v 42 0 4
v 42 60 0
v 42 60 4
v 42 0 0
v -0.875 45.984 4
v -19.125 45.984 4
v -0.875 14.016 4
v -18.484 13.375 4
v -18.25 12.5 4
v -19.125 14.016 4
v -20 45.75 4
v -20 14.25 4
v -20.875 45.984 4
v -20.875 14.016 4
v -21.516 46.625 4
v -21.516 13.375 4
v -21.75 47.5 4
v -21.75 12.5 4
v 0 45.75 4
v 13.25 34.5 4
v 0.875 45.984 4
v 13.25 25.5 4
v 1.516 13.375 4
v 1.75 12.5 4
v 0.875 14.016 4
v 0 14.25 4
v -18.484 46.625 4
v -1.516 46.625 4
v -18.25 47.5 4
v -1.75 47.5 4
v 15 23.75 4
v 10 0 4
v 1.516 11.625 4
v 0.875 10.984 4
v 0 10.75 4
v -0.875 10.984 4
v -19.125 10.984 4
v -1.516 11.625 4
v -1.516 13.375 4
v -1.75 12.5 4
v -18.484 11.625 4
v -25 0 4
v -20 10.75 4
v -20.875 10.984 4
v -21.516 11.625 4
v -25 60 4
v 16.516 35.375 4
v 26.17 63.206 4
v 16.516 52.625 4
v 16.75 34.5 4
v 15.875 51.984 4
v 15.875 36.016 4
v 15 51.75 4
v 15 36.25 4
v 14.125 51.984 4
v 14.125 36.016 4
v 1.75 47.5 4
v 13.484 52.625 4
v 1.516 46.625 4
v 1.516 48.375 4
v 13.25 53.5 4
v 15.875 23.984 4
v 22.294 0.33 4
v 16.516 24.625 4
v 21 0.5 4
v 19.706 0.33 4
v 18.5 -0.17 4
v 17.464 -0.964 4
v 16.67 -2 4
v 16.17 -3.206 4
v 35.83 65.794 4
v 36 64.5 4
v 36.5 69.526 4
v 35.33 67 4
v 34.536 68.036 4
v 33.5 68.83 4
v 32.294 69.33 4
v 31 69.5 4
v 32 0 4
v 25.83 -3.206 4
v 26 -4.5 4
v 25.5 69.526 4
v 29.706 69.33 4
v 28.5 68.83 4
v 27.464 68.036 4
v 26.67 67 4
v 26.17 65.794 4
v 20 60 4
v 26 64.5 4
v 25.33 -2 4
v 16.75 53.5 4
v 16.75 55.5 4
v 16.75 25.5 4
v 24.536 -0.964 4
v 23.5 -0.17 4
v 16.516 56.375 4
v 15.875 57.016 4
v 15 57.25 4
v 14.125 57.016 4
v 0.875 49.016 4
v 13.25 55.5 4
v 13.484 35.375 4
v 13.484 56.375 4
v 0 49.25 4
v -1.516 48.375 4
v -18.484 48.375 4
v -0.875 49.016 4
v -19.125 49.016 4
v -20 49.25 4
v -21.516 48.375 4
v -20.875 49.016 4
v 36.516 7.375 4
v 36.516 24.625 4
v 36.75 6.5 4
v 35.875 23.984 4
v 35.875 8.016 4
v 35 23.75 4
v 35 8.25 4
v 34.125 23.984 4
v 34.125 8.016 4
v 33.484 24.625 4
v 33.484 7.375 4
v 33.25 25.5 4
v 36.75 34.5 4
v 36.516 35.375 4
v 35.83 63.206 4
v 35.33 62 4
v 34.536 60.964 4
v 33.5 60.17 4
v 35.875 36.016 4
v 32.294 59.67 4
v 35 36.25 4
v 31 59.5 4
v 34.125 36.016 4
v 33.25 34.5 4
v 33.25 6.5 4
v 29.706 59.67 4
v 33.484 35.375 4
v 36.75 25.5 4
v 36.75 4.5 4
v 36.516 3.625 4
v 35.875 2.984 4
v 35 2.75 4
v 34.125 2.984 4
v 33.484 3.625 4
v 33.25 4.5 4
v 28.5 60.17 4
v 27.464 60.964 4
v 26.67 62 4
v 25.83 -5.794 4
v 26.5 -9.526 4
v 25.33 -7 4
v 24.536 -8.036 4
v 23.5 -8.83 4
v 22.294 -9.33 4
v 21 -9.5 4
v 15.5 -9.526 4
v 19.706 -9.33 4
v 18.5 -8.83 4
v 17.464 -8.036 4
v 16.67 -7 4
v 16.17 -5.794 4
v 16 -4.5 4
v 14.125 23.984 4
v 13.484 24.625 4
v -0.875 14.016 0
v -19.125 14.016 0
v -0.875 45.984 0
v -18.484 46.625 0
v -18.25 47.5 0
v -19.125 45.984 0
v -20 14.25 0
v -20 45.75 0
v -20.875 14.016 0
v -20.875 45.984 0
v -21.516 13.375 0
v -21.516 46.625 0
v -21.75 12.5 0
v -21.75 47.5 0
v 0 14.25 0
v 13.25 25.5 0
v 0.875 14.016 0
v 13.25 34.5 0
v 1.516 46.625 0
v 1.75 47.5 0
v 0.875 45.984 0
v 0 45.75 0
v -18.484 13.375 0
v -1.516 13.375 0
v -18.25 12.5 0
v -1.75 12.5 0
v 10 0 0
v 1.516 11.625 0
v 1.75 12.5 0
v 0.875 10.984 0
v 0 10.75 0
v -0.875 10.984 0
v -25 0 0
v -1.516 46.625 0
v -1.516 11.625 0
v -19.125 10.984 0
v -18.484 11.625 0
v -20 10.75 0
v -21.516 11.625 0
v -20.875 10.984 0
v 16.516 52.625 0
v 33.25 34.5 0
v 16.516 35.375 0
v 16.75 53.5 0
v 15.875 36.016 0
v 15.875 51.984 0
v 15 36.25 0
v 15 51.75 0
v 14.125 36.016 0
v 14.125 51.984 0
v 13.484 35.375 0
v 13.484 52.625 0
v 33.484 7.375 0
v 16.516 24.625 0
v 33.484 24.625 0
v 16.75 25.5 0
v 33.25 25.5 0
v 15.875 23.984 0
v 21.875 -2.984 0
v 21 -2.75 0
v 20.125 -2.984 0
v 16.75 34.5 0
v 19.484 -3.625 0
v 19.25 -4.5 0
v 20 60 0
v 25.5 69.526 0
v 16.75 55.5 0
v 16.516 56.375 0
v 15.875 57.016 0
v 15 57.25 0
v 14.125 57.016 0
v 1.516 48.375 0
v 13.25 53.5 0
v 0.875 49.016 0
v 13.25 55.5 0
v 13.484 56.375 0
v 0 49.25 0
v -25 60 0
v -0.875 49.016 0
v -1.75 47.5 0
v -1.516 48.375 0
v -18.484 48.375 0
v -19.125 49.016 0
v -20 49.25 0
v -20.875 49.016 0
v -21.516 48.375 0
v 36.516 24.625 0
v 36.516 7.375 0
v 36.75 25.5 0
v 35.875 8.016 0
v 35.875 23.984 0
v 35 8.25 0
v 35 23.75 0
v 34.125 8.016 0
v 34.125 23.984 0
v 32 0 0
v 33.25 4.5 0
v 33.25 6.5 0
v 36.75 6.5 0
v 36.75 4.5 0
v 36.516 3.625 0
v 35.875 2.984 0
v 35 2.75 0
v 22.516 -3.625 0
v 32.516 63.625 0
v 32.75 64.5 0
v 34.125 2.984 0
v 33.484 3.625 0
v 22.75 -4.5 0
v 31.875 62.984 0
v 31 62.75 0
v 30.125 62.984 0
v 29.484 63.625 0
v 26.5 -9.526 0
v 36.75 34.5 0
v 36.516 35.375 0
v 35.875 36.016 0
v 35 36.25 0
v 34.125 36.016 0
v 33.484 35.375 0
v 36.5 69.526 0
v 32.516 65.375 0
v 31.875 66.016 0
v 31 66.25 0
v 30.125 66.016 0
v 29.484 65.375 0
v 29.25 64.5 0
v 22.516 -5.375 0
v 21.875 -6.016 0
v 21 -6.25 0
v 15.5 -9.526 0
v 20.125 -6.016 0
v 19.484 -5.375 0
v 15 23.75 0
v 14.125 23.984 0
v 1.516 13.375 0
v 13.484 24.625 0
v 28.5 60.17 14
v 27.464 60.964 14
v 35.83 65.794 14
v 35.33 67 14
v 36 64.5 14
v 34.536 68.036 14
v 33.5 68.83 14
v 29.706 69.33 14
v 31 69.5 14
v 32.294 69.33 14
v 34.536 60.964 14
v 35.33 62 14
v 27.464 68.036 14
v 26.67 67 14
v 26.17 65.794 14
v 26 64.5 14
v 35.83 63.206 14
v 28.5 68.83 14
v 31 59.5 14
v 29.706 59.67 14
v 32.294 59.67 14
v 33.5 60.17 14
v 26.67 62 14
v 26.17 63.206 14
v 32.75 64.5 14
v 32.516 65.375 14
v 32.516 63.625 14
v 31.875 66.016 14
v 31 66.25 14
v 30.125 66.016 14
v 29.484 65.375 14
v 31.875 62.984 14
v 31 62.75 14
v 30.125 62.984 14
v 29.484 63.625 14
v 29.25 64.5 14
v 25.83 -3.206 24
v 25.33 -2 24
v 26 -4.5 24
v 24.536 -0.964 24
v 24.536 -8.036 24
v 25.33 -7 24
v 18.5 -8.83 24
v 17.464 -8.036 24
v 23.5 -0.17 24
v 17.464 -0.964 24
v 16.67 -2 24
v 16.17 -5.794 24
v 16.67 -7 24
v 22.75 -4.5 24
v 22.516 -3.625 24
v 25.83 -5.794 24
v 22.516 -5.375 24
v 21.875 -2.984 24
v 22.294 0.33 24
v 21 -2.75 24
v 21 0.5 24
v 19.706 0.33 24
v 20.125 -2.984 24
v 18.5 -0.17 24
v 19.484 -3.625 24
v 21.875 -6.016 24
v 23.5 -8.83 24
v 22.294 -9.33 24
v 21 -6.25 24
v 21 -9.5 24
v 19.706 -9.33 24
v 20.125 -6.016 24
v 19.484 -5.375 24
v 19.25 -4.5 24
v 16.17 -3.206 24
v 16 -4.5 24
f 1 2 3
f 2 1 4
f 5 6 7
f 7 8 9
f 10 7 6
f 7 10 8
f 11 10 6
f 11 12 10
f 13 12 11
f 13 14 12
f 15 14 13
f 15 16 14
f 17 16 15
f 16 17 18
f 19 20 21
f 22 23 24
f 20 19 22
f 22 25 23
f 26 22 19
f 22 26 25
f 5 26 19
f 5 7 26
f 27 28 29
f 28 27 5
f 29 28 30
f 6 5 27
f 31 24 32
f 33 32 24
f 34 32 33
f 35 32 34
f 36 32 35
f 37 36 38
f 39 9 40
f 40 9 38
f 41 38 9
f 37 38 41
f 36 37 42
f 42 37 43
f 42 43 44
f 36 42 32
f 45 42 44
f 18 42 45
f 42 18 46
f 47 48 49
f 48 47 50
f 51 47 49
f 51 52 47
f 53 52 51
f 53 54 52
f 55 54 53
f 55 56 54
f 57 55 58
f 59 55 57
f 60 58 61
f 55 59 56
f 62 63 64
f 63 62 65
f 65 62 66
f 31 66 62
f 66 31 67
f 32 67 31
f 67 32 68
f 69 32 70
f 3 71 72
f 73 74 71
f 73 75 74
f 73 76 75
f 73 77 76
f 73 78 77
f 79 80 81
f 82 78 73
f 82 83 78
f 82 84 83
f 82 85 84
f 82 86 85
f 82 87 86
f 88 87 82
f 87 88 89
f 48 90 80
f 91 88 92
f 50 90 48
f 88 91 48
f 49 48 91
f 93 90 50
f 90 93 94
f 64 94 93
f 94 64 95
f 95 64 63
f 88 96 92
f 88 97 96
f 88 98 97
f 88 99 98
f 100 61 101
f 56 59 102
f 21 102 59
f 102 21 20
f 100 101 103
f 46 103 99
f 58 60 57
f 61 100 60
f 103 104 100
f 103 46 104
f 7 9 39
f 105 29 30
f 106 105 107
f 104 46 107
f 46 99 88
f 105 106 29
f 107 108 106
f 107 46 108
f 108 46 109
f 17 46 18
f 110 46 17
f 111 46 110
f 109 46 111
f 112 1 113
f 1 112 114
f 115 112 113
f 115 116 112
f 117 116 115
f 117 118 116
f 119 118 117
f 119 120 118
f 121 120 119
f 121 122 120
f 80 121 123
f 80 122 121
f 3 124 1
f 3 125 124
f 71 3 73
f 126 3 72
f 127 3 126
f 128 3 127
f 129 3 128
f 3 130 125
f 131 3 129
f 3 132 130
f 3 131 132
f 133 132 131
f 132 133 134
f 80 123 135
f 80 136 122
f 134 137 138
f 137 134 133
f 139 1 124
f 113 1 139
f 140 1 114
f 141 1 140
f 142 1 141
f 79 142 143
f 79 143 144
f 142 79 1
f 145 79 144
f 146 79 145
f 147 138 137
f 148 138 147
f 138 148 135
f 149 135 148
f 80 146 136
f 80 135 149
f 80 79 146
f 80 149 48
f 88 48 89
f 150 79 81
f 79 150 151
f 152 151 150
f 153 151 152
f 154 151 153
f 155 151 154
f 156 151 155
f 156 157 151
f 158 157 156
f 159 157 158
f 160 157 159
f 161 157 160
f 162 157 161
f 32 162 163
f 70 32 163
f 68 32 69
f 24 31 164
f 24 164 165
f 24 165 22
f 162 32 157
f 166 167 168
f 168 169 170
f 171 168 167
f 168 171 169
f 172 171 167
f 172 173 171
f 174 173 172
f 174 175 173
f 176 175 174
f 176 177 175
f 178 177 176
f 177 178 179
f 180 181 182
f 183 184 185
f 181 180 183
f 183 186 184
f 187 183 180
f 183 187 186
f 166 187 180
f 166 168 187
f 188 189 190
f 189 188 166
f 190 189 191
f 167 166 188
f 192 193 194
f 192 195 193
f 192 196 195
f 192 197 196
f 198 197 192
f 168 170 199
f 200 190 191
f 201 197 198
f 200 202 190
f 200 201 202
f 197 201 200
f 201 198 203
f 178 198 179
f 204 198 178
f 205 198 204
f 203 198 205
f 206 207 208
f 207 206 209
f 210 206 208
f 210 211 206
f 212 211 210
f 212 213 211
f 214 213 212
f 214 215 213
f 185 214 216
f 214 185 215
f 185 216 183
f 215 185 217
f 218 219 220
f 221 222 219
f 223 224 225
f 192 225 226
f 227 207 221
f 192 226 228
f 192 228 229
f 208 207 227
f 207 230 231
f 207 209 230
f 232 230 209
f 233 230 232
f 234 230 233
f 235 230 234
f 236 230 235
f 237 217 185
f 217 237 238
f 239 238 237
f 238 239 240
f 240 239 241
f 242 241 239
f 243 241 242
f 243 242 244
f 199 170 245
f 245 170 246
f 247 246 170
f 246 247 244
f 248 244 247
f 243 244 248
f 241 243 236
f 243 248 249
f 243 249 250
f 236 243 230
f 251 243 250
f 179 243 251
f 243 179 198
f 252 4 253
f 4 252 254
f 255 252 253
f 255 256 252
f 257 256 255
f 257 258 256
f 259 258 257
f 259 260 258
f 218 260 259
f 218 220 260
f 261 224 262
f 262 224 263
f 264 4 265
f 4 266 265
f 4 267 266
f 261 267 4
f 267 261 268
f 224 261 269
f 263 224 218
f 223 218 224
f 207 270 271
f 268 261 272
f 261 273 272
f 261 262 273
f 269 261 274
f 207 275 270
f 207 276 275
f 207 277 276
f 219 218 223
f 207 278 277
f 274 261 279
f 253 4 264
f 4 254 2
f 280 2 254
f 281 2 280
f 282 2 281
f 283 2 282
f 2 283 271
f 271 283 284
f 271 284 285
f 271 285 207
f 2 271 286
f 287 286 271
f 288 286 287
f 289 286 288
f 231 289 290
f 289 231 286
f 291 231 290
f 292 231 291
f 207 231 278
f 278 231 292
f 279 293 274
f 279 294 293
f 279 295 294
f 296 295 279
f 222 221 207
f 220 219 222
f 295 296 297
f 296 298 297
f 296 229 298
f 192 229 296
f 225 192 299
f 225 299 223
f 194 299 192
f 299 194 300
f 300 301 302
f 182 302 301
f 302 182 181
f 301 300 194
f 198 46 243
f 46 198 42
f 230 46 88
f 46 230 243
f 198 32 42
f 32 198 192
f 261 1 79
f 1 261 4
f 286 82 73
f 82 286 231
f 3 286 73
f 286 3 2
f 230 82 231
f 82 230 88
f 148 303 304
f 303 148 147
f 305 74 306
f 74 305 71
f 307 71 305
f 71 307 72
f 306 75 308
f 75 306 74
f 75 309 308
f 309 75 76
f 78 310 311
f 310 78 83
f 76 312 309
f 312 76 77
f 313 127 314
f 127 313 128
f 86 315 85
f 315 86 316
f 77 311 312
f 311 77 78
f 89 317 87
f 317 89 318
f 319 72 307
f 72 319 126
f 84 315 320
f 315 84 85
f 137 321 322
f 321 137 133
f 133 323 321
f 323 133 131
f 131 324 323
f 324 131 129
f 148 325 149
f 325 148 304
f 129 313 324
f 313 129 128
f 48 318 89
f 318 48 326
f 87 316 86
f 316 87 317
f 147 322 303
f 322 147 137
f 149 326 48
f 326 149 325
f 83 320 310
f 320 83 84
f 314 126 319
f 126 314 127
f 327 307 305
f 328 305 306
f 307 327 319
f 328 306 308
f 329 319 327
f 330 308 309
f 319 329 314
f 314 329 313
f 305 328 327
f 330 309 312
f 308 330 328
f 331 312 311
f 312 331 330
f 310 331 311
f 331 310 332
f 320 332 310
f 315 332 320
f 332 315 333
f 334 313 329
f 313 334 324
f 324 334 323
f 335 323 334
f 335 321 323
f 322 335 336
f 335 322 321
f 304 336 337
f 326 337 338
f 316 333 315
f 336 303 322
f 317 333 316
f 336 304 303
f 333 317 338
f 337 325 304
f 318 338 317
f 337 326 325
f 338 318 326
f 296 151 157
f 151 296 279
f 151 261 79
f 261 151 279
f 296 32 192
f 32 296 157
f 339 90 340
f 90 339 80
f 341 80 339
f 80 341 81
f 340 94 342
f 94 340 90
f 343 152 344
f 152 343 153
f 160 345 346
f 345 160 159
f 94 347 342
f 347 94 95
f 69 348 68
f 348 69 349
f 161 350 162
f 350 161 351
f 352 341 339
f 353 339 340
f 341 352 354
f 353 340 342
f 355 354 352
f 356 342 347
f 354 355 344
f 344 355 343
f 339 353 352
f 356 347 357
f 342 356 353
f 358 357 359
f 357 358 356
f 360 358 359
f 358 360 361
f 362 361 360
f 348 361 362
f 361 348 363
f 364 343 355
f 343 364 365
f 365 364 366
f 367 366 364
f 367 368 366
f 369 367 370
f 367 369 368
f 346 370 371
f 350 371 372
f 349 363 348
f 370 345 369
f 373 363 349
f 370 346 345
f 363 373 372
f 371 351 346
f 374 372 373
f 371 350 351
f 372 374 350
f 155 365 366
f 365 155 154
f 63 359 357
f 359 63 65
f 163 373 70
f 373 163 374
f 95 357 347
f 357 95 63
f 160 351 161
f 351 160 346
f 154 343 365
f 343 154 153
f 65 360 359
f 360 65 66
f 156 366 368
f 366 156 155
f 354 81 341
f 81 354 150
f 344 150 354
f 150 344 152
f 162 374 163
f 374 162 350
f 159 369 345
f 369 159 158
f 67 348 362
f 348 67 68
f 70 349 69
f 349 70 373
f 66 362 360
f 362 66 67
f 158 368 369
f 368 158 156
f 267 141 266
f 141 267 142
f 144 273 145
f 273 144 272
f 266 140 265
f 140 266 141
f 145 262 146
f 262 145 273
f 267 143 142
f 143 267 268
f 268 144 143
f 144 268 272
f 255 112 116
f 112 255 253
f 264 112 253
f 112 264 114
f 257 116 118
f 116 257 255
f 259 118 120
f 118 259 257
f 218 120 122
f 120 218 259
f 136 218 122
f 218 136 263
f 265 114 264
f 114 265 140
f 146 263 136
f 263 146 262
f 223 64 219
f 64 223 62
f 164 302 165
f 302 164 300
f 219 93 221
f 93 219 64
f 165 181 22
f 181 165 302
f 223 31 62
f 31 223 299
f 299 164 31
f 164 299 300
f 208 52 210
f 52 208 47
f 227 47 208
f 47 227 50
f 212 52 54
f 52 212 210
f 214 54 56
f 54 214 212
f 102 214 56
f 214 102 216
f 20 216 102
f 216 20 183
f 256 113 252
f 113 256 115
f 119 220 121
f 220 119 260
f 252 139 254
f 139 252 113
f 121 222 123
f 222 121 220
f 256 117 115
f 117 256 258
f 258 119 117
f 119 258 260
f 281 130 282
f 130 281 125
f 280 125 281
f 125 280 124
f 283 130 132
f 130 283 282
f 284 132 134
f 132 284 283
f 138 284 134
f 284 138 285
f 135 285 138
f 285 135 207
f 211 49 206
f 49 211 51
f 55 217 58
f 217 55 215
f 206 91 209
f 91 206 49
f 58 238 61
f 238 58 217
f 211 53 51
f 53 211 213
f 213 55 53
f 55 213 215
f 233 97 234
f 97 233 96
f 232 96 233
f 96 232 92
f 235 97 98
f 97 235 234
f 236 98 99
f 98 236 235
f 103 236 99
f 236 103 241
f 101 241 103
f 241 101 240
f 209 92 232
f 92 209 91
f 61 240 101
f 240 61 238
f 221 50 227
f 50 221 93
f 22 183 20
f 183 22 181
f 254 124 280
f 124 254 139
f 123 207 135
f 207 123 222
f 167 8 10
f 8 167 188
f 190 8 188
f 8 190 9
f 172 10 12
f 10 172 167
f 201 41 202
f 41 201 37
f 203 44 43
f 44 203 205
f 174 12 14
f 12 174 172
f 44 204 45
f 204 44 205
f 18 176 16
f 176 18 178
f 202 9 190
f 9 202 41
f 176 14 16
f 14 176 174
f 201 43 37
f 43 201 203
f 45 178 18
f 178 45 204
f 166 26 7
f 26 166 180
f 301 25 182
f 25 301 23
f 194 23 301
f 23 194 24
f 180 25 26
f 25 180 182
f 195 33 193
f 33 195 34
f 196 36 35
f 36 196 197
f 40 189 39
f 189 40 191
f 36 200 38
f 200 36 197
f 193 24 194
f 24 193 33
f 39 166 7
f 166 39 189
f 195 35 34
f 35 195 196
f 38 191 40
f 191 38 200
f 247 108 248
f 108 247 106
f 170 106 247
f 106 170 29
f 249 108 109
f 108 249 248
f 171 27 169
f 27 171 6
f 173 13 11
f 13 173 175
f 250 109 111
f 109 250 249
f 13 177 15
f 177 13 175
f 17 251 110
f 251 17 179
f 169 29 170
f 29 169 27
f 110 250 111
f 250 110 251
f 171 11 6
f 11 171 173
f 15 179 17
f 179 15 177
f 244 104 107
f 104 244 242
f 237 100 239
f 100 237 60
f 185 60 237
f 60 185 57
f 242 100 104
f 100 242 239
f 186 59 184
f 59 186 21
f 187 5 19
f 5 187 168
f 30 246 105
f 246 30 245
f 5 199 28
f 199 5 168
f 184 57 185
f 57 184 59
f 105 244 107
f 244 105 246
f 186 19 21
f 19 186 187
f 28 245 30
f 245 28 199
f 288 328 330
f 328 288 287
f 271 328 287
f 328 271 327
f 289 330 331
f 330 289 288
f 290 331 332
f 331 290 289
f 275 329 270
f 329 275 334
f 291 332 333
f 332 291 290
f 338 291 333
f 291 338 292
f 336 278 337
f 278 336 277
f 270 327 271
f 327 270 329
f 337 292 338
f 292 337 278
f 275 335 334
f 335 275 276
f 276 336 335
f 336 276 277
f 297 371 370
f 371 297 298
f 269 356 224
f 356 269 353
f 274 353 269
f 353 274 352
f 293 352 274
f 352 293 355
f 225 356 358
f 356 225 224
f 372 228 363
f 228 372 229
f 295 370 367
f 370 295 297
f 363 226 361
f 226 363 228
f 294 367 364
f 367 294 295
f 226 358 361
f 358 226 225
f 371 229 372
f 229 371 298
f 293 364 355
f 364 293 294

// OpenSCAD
difference()
{
    union()
    {
        translate([-30+5,0,0])
            cube([30-5+42,60,4]);
        
        translate([21+10,30+29/2+11+4-4+5-.5,0])
            cylinder(d=22,h=4,$fn=6);
        translate([21+10,30+29/2+11+4+5,4])
            cylinder(d=10,h=10,$fn=24);
        
        translate([21,0,0])
            cylinder(d=22,h=4,$fn=6);
        translate([21,30-29/2-11-4-5,4])
            cylinder(d=10,h=10+10,$fn=24);
        
        //translate([21-4,6,0])
          //  cylinder(d=22,h=4,$fn=6);
        
    }
    union()
    {
        translate([15+20,30-29/2-6-4-1,0])
            cylinder(d=3.5,h=4,$fn=12);
        translate([15+20,30-29/2-6-4+1,0])
            cylinder(d=3.5,h=4,$fn=12);
        translate([15+20-3.5/2,30-29/2-6-4-1,0])
            cube([3.5,2,4]);
        
        translate([15,30-29/2+6+4,0])
            cylinder(d=3.5,h=4,$fn=12);
        translate([15,30+29/2-5-5,0])
            cylinder(d=3.5,h=4,$fn=12);
        //translate([15,30+29/2+5+5,0])
          //  cylinder(d=3.5,h=4,$fn=12);
        
        //translate([15+20,30-29/2-6-4,0])
          //  cylinder(d=3.5,h=4,$fn=12);
        translate([15+20,30-29/2+6+4,0])
            cylinder(d=3.5,h=4,$fn=12);
        translate([15+20,30+29/2-5-5,0])
            cylinder(d=3.5,h=4,$fn=12);
        
        translate([15,30+29/2+5+5-1,0])
            cylinder(d=3.5,h=4,$fn=12);
        translate([15,30+29/2+5+5+1,0])
            cylinder(d=3.5,h=4,$fn=12);
        translate([15-3.5/2,30+29/2+6+4-1,0])
            cube([3.5,2,4]);
        
        translate([15-3.5/2,30-29/2+6+4,0])
            cube([3.5,9,4]);
        translate([15-3.5/2+20,30-29/2+6+4,0])
            cube([3.5,9,4]);
        
        
        
        translate([-20,25/2,0])
            cylinder(d=3.5,h=4,$fn=12);
        translate([0,25/2,0])
            cylinder(d=3.5,h=4,$fn=12);
        
        translate([-20,60-25/2,0])
            cylinder(d=3.5,h=4,$fn=12);
        translate([0,60-25/2,0])
            cylinder(d=3.5,h=4,$fn=12);
        
        
        translate([21+10,30+29/2+11+4+5,0])
            cylinder(d=3.5,h=40,$fn=12);
        translate([21,30-29/2-11-4-5,0])
            cylinder(d=3.5,h=40,$fn=12);
    }
}
/*
translate([10,30-29/2-6,4])
difference()
{
    union()
    {
        cube([30,12,10]);
        
        translate([2,-4-3,0])
            cube([6,8,10]);
            //cylinder(d=3.5,h=4,$fn=12);
        translate([2,11,0])
            cube([6,8,10]);
        translate([2+20,11,0])
            cube([6,8,10]);
    }
    union()
    {
        translate([0,6,4])
            rotate([0,90,0])
                cylinder(d=8,h=30,$fn=24);
        
        translate([5,-4,0])
            cylinder(d=3.5,h=10,$fn=12);
        translate([5,6+6+4,0])
            cylinder(d=3.5,h=10,$fn=12);
        translate([5+20,6+6+4,0])
            cylinder(d=3.5,h=10,$fn=12);
    }
}

translate([10,30+29/2-6,4])
difference()
{
    union()
    {
        cube([30,12,10]);
    }
    union()
    {
        translate([0,6,4])
            rotate([0,90,0])
                cylinder(d=8,h=30,$fn=24);
    }
}
*/
/*
translate([15,30+29/2,4+4])
    rotate([0,90,0])
        cylinder(d=8,h=100,$fn=24);
translate([15,30-29/2,4+4])
    rotate([0,90,0])
        cylinder(d=8,h=100,$fn=24);
        
translate([30,-5,4+20])
    cube([50,1.5,6]);
translate([20,60+5,4+10])
    cube([50,1.5,6]);
    
translate([60+54/2-15,30-29/2-11,4+4-17])
    cube([30,22,34]);
        
translate([60,30-29/2-11-4,4+4-22-5])
difference()
{
    union()
    {
        cube([54,29+11*2+4*2,50+5+3]);
    }
    union()
    {
        translate([0,4,4])
            cube([54,29+11*2,50+5+3]);
        
        translate([54/2,4,27])
            rotate([90,0,0])
                cylinder(d=3.5,h=70,$fn=12);
        
        translate([54/2-9,0,27-12])
            rotate([270,0,0])
                cylinder(d=4.4,h=70,$fn=12);
        translate([54/2+9,0,27-12])
            rotate([270,0,0])
                cylinder(d=4.4,h=70,$fn=12);
        translate([54/2-9,0,27+12])
            rotate([270,0,0])
                cylinder(d=4.4,h=70,$fn=12);
        translate([54/2+9,0,27+12])
            rotate([270,0,0])
                cylinder(d=4.4,h=70,$fn=12);
        
        
        translate([54/2-5,(29+11*2+4*2)/2-20,0])
            cylinder(d=3.5,h=7,$fn=12);
        translate([54/2+5,(29+11*2+4*2)/2-20,0])
            cylinder(d=3.5,h=7,$fn=12);
        translate([54/2-5,(29+11*2+4*2)/2+20,0])
            cylinder(d=3.5,h=7,$fn=12);
        translate([54/2+5,(29+11*2+4*2)/2+20,0])
            cylinder(d=3.5,h=7,$fn=12);
            
        translate([54/2-20,(29+11*2+4*2)/2-5,0])
            cylinder(d=3.5,h=7,$fn=12);
        translate([54/2-20,(29+11*2+4*2)/2+5,0])
            cylinder(d=3.5,h=7,$fn=12);
            
        
        translate([54/2,(29+11*2+4*2)/2,0])
            cylinder(d=16.2,h=4,$fn=64);
            
        translate([54/2-20,(29+11*2+4*2)/2-20,0])
            cylinder(d=3.5,h=4,$fn=64);
        translate([54/2+20,(29+11*2+4*2)/2-20,0])
            cylinder(d=3.5,h=4,$fn=64);
        translate([54/2-20,(29+11*2+4*2)/2+20,0])
            cylinder(d=3.5,h=4,$fn=64);
        translate([54/2+20,(29+11*2+4*2)/2+20,0])
            cylinder(d=3.5,h=4,$fn=64);
            
            
            
        translate([7,0,19+4+20+3-7])
            rotate([270,0,0])
                cylinder(d=3.4,h=10,$fn=12);
        translate([7,0,19+4+20+3+7])
            rotate([270,0,0])
                cylinder(d=3.4,h=10,$fn=12);
                
        translate([54-7,0,19+4+10+3-7])
            rotate([270,0,0])
                cylinder(d=3.4,h=10,$fn=12);
        translate([54-7,0,19+4+10+3+7])
            rotate([270,0,0])
                cylinder(d=3.4,h=10,$fn=12);
                
        translate([7,29+11*2+4,19+4+10+3-7])
            rotate([270,0,0])
                cylinder(d=3.4,h=10,$fn=12);
        translate([7,29+11*2+4,19+4+10+3+7])
            rotate([270,0,0])
                cylinder(d=3.4,h=10,$fn=12);
                
        translate([54-7,29+11*2+4,19+4+20+3-7])
            rotate([270,0,0])
                cylinder(d=3.4,h=10,$fn=12);
        translate([54-7,29+11*2+4,19+4+20+3+7])
            rotate([270,0,0])
                cylinder(d=3.4,h=10,$fn=12);
    }
}



*/
